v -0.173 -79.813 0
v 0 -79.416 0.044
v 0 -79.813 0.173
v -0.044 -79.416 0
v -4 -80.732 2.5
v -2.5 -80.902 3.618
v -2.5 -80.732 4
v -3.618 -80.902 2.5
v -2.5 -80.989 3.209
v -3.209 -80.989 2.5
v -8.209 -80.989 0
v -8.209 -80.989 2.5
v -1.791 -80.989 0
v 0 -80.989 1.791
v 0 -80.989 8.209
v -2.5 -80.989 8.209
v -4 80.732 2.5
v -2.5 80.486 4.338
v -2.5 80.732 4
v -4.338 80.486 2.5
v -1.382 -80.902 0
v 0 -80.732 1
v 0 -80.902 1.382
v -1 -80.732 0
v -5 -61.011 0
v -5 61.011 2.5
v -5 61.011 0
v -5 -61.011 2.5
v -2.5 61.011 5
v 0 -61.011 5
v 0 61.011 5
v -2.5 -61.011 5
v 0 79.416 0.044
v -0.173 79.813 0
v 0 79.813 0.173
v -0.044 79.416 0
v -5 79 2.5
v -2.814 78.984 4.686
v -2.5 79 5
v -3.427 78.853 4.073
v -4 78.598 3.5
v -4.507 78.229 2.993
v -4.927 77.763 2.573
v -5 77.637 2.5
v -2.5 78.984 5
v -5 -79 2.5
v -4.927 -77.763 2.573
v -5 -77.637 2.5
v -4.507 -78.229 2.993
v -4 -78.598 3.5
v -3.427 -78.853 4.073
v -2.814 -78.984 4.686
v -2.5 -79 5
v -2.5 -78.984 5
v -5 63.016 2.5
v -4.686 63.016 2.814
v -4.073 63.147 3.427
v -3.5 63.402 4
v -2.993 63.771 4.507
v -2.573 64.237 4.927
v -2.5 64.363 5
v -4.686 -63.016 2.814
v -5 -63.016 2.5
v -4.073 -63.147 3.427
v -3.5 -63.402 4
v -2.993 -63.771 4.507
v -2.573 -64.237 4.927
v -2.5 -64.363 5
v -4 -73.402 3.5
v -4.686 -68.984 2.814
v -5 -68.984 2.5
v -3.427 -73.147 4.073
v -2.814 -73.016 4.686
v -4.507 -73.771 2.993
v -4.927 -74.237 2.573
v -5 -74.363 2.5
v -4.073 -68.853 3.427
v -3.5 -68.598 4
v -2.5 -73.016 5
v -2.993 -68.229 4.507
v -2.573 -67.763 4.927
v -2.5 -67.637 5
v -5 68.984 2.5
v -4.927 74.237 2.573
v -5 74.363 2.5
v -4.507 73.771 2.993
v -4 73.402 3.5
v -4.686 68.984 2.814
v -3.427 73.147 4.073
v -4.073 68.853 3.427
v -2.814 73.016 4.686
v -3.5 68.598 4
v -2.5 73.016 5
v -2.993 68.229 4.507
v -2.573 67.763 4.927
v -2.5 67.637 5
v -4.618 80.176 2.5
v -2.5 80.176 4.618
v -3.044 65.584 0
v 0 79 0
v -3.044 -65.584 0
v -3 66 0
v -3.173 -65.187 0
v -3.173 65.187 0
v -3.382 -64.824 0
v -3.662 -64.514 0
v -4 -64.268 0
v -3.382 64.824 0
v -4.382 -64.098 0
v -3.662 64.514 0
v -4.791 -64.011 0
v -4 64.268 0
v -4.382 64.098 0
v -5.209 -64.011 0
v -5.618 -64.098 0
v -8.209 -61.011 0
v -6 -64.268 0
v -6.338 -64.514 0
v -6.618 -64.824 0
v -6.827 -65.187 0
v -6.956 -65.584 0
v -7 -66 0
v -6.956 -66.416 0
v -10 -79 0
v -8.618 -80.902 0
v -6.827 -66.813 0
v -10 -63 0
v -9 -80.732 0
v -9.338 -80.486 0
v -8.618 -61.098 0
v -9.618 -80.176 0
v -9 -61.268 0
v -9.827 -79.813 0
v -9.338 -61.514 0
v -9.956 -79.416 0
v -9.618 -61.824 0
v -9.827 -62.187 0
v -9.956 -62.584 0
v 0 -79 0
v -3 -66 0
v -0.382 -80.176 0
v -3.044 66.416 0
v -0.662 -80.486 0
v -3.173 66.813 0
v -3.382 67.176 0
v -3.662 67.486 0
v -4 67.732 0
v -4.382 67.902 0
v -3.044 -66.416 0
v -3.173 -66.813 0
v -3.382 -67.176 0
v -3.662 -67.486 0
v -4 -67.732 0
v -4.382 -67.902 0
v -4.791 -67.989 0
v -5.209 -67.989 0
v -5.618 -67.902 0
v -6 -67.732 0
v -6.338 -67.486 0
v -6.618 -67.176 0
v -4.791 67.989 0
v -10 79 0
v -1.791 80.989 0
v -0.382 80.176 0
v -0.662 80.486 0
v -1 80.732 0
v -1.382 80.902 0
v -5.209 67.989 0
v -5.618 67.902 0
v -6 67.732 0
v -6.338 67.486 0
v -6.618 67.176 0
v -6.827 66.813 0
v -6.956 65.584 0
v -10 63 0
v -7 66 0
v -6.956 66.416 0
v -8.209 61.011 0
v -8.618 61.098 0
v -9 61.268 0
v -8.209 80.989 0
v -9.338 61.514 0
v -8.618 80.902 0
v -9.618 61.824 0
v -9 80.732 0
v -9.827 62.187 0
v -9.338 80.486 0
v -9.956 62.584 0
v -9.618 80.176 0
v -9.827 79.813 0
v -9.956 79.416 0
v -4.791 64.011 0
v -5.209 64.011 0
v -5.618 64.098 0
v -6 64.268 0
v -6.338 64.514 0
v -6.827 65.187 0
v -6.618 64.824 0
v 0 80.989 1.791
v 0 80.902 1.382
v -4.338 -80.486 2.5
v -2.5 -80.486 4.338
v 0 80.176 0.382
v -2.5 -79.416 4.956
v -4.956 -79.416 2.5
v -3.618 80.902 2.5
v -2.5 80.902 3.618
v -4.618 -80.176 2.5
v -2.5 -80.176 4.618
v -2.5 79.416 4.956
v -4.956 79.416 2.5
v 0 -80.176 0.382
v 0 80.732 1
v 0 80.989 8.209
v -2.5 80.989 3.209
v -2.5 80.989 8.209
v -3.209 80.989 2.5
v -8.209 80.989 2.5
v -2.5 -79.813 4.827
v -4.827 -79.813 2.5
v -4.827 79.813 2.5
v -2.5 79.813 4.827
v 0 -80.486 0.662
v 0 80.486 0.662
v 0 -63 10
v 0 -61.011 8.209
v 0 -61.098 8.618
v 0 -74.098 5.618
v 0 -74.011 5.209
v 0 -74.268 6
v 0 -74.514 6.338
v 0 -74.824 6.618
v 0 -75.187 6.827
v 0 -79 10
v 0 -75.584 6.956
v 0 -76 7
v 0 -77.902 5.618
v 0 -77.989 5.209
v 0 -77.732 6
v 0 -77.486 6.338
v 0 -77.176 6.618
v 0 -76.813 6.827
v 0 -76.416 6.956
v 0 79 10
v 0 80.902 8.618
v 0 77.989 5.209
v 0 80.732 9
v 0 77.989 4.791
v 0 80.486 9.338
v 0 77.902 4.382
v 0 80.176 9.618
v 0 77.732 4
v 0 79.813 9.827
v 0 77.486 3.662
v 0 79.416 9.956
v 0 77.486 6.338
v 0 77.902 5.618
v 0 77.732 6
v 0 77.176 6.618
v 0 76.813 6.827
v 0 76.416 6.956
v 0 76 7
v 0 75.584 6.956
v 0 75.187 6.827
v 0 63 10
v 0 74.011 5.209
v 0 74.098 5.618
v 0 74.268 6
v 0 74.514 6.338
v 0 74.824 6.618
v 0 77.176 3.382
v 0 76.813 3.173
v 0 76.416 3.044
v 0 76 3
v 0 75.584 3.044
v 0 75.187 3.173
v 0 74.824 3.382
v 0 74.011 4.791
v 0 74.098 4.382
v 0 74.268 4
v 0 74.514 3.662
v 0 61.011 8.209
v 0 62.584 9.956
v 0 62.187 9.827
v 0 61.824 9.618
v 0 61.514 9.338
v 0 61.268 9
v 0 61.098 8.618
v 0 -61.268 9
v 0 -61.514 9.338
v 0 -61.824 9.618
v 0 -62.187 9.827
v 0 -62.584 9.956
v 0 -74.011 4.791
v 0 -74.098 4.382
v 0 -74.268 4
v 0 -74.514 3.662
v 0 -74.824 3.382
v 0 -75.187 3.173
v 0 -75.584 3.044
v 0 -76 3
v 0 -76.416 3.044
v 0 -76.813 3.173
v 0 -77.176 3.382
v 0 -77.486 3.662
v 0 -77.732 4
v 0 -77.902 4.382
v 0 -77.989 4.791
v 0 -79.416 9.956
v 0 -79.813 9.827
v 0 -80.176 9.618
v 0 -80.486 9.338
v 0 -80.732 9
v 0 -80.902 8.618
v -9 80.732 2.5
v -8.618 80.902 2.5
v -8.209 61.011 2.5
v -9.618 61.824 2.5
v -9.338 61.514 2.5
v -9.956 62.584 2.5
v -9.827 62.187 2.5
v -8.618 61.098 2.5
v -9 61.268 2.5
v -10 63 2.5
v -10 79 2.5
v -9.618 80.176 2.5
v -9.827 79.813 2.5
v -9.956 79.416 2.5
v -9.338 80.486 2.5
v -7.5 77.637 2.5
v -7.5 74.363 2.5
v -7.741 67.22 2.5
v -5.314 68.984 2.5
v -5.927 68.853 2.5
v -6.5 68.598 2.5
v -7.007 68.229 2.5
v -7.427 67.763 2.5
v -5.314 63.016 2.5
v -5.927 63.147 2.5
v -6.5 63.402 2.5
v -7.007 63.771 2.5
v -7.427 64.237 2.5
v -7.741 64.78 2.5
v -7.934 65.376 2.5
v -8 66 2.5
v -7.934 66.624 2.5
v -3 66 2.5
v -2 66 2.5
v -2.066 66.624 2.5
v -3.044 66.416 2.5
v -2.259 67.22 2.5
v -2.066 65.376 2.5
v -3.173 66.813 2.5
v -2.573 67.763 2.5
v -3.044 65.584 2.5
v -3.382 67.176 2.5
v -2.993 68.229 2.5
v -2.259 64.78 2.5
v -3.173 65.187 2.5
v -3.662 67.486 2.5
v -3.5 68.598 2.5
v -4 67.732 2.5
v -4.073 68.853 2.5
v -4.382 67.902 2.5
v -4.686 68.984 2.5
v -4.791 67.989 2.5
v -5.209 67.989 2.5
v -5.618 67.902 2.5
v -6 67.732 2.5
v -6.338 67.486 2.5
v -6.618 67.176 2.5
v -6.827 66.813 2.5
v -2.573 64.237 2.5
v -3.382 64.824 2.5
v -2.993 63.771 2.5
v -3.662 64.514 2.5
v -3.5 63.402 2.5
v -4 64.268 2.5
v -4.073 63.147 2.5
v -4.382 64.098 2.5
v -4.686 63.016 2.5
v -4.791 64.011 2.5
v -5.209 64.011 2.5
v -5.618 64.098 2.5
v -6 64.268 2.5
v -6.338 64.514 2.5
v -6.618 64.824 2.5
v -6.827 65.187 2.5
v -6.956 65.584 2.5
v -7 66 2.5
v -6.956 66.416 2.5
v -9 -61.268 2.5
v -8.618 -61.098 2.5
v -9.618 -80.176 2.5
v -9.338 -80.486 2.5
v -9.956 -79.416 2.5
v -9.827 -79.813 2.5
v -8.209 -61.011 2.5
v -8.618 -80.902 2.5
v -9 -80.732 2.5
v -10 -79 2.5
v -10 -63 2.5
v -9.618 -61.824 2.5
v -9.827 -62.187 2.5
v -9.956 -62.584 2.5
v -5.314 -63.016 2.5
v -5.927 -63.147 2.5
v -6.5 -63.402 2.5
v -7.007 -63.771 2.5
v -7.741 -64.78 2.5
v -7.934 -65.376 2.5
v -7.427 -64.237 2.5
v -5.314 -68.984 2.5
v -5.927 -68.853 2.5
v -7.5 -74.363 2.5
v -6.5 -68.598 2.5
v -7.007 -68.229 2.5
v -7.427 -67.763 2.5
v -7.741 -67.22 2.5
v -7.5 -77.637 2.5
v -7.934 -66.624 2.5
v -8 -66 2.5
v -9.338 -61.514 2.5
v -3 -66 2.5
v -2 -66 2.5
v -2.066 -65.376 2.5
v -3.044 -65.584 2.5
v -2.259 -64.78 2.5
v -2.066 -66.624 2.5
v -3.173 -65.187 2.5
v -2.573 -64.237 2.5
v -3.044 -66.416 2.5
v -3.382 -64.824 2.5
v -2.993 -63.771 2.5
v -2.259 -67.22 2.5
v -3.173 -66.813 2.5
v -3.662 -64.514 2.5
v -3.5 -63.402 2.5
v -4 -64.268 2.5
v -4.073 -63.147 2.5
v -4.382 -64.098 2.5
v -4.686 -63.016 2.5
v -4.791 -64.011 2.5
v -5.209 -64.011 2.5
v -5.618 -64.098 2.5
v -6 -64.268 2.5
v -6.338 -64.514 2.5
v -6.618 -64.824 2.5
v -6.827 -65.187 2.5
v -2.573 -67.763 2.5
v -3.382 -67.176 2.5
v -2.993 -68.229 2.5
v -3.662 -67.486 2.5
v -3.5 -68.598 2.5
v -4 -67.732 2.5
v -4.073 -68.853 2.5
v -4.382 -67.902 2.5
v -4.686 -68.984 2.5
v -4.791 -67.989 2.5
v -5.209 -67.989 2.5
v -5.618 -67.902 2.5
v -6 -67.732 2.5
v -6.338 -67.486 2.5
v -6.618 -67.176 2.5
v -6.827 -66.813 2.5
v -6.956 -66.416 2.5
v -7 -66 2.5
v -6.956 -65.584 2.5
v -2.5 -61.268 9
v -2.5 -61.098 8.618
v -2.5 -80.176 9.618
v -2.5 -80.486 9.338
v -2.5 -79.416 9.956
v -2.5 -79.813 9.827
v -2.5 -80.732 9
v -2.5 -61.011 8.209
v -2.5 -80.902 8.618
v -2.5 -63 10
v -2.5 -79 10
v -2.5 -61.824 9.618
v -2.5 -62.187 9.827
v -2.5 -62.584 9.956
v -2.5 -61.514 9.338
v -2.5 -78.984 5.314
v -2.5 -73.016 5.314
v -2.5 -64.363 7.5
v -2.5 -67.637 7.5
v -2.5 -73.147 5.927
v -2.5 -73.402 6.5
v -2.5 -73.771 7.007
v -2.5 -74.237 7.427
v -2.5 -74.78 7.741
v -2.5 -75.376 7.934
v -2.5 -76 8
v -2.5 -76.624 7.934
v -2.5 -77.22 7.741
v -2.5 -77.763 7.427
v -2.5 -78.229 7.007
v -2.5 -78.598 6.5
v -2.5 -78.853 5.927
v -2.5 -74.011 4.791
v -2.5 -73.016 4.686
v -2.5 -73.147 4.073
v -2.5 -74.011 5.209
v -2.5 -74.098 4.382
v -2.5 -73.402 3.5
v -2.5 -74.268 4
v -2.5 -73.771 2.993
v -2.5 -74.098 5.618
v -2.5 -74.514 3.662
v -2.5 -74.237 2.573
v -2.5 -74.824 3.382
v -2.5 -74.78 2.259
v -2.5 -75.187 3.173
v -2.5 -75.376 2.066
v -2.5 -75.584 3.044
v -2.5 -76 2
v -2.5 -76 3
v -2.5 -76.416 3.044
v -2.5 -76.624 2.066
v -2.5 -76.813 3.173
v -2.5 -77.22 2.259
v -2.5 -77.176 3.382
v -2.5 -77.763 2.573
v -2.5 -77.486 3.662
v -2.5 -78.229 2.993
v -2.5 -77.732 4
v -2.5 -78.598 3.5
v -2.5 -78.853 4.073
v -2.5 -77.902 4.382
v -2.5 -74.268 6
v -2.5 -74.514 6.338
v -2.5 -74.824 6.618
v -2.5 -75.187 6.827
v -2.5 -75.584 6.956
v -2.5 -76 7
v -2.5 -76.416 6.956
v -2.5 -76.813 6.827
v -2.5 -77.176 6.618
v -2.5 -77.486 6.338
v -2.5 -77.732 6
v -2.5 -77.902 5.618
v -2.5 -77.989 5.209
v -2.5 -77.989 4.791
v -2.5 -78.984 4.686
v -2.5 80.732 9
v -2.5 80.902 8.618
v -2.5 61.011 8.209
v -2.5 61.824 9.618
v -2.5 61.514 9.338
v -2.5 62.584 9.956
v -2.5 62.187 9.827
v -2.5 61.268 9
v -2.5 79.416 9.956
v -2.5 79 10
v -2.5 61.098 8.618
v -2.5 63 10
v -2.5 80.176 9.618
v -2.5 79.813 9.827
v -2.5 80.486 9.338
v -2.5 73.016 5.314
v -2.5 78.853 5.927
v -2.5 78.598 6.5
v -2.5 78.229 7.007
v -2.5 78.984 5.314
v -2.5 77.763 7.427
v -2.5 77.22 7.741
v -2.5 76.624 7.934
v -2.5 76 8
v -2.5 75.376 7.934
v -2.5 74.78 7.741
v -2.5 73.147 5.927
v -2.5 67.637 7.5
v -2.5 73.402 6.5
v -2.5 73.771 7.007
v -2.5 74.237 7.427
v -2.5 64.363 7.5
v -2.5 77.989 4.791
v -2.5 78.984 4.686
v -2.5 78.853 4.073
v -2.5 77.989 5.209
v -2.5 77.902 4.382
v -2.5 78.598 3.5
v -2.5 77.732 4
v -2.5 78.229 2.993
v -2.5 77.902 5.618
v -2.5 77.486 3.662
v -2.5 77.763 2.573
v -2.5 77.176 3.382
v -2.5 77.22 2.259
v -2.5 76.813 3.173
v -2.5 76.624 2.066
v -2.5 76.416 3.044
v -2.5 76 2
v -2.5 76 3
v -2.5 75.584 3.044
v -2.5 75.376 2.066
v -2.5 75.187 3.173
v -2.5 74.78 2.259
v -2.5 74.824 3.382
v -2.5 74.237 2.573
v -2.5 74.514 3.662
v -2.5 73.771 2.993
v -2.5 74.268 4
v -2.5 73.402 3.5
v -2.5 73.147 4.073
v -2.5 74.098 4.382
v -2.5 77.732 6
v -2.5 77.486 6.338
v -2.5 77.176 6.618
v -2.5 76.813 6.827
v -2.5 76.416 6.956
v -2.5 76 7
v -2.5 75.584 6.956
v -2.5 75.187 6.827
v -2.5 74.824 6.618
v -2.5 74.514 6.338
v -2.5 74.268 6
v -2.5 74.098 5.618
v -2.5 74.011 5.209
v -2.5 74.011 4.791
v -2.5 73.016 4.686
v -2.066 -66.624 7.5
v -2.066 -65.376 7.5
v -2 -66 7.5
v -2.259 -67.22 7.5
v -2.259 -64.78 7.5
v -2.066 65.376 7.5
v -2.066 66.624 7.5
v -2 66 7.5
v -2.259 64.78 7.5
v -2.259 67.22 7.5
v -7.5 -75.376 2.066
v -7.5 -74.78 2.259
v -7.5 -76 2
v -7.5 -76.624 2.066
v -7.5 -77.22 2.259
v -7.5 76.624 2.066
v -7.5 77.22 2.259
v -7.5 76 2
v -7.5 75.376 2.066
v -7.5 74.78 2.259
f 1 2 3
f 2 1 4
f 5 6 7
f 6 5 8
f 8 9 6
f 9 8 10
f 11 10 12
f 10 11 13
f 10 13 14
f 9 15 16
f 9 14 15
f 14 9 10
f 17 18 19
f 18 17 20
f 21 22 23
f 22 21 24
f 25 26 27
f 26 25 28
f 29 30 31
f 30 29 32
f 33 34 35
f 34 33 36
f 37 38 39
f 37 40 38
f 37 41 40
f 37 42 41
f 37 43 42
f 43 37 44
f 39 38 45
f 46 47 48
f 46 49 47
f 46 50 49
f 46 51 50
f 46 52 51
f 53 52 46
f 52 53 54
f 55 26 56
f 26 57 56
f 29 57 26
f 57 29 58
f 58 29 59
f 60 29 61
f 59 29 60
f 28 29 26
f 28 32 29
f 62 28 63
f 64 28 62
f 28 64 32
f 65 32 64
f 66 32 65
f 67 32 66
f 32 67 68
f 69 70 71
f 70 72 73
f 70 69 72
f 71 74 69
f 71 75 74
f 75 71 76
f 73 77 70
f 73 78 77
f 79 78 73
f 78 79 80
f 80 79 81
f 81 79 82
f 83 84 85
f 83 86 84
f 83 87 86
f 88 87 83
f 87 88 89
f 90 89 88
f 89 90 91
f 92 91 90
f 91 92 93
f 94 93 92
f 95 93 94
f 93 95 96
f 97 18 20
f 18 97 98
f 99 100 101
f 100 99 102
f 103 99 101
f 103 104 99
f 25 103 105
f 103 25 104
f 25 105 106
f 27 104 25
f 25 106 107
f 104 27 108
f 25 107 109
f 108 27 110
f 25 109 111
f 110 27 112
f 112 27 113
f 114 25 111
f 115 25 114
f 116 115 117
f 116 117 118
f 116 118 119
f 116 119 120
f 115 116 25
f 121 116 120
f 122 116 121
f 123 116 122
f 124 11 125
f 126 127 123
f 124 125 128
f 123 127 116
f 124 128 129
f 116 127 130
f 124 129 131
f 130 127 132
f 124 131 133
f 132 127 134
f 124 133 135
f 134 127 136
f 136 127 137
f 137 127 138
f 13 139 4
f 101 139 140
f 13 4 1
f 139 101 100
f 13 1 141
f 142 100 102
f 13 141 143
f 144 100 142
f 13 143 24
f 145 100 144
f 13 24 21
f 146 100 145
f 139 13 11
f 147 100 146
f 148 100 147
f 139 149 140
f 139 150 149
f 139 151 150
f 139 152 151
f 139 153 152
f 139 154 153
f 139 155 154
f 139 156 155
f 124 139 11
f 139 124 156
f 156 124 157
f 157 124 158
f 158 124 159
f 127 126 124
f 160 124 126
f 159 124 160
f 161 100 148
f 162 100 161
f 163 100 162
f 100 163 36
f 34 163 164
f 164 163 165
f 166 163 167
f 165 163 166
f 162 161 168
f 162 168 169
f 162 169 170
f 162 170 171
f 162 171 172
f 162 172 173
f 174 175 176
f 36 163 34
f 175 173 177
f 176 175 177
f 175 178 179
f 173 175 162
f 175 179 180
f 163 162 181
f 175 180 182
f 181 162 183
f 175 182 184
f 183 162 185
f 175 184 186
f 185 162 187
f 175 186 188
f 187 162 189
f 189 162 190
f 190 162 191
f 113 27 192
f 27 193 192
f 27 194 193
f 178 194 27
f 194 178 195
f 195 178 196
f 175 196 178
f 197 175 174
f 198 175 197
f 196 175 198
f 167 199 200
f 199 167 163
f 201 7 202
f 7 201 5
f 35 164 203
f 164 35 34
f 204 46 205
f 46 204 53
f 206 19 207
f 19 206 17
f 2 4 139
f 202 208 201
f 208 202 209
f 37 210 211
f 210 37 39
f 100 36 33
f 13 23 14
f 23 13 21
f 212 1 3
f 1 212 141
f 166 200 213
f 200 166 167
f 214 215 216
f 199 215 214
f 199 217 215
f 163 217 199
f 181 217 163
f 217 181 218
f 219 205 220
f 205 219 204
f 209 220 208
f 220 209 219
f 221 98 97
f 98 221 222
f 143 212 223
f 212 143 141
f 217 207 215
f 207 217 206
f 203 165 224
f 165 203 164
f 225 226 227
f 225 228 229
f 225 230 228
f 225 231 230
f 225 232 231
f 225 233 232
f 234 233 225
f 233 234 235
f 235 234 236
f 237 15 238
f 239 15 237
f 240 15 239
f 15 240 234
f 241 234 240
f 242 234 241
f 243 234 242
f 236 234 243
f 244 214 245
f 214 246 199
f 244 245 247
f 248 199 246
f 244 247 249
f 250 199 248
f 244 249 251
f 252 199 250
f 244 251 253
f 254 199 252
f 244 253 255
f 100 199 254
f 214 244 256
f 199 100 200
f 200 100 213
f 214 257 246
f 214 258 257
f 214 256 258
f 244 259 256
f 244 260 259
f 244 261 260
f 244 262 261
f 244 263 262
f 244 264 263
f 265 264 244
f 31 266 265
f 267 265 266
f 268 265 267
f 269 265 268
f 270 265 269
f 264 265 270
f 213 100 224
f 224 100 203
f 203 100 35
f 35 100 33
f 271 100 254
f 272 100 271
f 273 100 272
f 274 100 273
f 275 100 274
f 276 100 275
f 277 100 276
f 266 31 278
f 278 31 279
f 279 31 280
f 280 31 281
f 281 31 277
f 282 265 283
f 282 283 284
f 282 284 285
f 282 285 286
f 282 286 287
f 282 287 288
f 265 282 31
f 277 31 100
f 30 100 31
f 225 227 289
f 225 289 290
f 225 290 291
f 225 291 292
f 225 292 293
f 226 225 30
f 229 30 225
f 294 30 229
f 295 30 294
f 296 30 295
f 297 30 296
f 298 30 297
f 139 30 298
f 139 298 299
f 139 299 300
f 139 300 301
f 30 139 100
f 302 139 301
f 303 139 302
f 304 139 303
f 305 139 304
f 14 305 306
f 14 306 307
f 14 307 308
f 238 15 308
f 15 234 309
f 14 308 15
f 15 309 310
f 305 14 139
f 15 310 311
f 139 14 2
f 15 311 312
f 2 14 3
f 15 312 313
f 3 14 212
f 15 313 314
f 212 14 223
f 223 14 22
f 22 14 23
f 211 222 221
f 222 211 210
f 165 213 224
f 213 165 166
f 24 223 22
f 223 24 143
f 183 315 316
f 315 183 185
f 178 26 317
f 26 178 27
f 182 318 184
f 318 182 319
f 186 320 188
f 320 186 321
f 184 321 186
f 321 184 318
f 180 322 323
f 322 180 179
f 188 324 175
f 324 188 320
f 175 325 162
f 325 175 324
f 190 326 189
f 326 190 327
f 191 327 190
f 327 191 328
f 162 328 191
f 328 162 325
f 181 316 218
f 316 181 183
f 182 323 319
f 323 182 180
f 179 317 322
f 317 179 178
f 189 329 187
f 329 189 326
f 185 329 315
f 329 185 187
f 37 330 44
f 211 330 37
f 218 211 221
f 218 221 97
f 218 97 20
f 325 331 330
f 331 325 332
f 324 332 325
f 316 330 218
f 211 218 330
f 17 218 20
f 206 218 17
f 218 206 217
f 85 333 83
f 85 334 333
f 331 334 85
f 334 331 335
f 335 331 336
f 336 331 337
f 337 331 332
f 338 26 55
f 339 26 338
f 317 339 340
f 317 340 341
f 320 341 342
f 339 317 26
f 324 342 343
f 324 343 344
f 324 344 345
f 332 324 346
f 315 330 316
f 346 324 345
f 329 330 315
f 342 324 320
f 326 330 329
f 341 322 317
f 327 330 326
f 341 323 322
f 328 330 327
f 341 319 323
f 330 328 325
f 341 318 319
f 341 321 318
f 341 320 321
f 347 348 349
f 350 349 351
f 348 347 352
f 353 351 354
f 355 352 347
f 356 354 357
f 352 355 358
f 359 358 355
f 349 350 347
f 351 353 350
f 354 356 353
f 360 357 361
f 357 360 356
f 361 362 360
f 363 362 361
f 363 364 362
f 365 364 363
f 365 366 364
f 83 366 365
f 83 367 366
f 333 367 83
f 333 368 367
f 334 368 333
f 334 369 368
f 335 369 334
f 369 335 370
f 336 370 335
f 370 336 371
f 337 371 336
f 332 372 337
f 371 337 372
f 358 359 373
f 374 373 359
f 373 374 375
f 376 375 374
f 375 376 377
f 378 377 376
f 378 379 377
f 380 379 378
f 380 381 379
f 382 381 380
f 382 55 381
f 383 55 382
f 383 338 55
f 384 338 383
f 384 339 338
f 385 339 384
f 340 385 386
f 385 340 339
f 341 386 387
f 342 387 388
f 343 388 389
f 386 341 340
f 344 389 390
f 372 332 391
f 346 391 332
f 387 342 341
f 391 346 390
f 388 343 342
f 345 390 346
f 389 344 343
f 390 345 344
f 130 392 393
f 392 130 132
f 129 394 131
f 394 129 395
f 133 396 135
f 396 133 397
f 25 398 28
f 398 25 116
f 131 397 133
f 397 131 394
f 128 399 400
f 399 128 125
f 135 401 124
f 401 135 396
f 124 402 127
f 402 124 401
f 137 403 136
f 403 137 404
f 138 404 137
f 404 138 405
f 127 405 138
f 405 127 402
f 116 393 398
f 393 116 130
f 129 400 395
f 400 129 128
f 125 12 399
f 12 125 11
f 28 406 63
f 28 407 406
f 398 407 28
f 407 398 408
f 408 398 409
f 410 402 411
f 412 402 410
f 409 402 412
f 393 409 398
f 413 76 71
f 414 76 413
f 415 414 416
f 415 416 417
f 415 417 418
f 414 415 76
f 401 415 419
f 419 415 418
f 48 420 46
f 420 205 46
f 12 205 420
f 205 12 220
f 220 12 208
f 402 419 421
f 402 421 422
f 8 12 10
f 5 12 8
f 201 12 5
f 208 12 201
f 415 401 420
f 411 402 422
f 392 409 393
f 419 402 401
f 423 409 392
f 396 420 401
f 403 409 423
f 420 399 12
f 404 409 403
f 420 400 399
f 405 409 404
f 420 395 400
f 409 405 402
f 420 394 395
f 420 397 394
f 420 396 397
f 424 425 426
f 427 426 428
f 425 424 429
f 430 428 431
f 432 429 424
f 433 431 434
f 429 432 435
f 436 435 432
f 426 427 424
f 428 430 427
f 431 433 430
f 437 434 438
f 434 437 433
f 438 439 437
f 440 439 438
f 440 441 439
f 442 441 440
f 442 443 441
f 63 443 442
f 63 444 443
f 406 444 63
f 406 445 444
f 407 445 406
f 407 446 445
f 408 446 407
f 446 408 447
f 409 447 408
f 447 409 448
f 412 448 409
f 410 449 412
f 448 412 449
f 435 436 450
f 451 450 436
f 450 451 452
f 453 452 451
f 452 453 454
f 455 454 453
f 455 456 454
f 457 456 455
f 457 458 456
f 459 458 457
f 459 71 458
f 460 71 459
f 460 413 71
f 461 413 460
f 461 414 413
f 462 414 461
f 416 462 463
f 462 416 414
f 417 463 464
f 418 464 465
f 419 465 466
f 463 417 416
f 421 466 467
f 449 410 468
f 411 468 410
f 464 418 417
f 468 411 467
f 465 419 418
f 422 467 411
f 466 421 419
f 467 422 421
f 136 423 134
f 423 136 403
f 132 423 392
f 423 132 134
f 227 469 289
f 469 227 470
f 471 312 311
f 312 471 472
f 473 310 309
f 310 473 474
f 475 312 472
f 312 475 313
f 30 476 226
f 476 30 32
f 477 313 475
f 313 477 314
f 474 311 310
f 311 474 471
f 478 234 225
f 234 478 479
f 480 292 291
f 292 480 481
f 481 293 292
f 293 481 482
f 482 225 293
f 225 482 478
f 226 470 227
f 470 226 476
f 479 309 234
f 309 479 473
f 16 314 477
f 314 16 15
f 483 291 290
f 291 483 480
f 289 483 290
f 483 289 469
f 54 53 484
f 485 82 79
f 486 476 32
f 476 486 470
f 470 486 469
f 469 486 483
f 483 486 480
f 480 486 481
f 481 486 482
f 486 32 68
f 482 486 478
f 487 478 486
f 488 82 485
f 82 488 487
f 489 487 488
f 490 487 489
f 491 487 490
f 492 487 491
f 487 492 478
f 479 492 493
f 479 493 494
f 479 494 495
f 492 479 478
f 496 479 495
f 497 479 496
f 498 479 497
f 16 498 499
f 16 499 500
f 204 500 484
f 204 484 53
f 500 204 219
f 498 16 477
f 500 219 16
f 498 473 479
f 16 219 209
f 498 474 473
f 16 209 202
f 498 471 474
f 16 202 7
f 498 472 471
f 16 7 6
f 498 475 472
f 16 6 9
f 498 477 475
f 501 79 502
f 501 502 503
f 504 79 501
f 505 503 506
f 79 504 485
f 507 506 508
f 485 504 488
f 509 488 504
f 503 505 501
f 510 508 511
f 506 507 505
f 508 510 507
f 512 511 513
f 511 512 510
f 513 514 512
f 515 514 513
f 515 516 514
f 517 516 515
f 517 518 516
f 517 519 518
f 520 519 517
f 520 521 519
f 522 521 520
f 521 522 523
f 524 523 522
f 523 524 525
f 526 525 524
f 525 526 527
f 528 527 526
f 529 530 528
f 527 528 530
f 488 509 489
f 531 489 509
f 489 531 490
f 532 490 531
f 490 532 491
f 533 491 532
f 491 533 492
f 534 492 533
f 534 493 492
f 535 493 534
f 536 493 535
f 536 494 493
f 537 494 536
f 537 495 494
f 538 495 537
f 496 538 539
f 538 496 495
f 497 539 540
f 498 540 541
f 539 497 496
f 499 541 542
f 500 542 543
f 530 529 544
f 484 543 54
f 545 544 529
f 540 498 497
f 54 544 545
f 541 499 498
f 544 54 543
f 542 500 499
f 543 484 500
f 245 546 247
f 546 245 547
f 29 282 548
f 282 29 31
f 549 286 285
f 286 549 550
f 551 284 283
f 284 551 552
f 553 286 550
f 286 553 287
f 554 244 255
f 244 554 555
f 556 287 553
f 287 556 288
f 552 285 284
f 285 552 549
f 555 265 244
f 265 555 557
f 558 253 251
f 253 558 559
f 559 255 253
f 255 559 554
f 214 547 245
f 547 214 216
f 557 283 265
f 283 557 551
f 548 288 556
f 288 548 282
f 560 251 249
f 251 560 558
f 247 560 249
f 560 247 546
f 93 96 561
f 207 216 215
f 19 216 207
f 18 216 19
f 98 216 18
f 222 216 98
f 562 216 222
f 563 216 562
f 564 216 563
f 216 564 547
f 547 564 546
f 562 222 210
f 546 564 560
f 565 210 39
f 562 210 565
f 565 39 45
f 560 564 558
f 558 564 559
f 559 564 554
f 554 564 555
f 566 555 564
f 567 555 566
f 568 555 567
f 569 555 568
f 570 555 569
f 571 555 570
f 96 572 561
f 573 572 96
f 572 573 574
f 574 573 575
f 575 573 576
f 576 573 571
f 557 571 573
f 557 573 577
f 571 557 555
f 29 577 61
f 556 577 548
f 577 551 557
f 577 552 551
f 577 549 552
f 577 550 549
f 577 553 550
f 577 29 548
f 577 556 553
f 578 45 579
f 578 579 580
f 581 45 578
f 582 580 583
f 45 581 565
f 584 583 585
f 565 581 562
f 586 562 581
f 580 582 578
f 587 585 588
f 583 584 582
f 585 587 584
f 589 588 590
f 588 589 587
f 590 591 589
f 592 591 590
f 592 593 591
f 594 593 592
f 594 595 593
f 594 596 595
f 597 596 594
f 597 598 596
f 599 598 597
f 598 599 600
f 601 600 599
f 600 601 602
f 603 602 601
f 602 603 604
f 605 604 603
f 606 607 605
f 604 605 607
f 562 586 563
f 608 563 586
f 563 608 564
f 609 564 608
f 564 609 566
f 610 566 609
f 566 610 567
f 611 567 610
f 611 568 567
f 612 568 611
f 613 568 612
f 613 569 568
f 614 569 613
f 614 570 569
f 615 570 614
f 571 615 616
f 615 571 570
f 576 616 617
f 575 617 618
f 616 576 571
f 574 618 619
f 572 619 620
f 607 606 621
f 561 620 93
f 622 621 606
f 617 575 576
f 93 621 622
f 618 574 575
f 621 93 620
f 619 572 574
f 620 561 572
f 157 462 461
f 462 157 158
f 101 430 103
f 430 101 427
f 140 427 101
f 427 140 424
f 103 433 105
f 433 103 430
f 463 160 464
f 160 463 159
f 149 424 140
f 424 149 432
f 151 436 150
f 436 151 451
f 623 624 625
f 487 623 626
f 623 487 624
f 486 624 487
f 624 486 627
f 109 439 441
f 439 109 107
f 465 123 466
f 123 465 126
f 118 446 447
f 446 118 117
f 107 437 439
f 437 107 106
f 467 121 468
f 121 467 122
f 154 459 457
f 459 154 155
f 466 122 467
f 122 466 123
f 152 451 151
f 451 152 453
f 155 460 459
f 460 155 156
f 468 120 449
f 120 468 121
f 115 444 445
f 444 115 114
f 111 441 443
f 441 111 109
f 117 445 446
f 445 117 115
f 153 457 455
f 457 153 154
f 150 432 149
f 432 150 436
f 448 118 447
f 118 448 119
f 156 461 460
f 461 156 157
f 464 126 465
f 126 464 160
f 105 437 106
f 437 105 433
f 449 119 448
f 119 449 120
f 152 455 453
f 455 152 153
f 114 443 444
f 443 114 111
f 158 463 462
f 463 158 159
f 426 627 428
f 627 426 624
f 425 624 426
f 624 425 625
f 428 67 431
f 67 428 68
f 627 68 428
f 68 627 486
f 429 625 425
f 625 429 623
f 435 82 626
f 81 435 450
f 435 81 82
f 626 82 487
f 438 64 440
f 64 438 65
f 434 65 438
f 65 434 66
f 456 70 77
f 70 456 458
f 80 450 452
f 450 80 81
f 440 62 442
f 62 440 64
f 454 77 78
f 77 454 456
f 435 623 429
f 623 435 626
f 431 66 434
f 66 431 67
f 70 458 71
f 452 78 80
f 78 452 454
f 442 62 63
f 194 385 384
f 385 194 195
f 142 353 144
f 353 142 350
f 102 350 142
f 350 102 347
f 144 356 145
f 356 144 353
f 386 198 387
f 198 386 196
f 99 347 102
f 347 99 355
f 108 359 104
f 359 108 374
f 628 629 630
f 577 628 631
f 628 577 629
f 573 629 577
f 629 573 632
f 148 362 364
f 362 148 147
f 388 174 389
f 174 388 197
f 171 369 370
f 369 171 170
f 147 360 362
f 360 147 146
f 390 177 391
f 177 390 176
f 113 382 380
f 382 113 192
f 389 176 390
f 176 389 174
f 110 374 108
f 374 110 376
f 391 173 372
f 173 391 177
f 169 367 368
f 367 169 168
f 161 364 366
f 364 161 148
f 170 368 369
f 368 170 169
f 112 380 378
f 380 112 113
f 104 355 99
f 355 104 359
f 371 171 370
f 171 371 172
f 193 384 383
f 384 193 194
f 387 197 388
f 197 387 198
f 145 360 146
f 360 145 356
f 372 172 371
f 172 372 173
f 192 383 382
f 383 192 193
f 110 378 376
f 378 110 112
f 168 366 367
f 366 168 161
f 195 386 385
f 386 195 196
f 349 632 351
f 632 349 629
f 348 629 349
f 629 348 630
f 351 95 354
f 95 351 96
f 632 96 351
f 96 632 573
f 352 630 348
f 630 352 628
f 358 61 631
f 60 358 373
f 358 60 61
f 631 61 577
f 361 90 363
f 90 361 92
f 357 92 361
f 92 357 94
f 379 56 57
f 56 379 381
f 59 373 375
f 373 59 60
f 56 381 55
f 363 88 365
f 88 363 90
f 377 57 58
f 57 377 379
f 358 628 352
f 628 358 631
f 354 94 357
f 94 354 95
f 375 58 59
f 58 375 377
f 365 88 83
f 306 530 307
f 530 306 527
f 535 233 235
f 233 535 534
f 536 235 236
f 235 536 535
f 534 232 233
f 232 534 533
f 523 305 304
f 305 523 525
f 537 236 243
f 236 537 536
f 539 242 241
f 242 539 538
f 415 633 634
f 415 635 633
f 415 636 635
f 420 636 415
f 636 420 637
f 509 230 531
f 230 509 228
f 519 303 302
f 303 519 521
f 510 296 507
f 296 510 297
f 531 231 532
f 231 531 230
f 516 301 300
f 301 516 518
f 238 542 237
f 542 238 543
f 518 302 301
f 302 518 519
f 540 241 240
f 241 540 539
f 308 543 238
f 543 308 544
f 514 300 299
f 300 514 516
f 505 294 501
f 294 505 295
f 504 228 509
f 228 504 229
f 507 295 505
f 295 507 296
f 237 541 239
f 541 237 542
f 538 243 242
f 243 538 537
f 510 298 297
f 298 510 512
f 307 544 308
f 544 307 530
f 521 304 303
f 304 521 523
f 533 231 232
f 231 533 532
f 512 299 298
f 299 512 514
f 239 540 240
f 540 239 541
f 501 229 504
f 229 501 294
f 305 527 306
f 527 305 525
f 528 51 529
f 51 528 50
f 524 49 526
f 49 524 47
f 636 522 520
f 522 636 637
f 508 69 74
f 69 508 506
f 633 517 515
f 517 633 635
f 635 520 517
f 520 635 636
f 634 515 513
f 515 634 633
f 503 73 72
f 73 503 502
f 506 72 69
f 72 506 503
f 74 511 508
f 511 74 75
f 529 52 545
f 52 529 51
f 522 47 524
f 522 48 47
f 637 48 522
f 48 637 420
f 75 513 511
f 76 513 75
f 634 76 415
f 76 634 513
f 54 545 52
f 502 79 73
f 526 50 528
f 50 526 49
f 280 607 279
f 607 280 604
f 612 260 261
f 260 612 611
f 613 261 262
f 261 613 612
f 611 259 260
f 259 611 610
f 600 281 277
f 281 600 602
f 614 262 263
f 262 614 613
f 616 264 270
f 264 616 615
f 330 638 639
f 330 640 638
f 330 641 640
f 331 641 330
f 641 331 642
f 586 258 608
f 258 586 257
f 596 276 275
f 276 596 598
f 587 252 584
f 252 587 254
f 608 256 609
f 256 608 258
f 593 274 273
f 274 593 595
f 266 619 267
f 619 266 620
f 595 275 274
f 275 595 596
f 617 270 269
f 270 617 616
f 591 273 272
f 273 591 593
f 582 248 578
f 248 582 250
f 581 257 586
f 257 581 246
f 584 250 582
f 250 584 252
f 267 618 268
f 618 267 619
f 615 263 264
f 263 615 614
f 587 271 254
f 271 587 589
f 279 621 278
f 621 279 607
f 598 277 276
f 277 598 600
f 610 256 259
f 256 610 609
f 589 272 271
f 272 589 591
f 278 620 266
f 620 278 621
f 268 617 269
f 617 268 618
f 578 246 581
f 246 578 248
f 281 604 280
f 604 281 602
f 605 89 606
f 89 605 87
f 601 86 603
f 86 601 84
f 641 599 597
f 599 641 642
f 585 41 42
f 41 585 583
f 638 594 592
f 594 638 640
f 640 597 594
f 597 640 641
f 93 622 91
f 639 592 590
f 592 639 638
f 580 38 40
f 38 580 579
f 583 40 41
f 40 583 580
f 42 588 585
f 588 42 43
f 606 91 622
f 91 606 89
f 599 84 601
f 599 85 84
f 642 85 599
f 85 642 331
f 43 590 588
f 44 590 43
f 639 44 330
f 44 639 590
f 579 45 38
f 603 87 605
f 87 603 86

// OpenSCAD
HEIGHT = 10;
HEIGHT_MIDDLE = 5;
WIDTH = 162;
WIDTH_MIDDLE = WIDTH - 2 * 20;
THICKNESS = 2.5;
CORNER_DIA = 4;

MOUNT_HOLE_DIA = 4;
MOUNT_HOLE_HEAD_DIA = 6;
MOUNT_HOLE_OFFSET = 5;
MOUNT_HOLE_SPACING_TOP = WIDTH - 2 * MOUNT_HOLE_OFFSET;
MOUNT_HOLE_SPACING_BOT = WIDTH_MIDDLE + 2 * MOUNT_HOLE_OFFSET;

$fn = 30;

module rounded_rect(width, length, height, corner_dia) {
  hull() {
    for(i = [-1, 1]) {
      for(j = [-1, 1]) {
        translate([i * (width - corner_dia)/2, j * (length - corner_dia)/2, 0])
        cylinder(d = corner_dia, h = height);
      }
    }
  }
}

module mounting_holes(spacing) {
  #for(i = [-1, 1]) {
    translate([-MOUNT_HOLE_OFFSET, i * spacing/2, 0]) {
      cylinder(d = MOUNT_HOLE_DIA, h = HEIGHT);
      translate([0, 0, HEIGHT/2])
      cylinder(d = MOUNT_HOLE_HEAD_DIA, h = HEIGHT/2);
    }
  }
}

difference() {
  union() {
    hull() {
    translate([-HEIGHT_MIDDLE/2, 0, 0])
    rounded_rect(HEIGHT_MIDDLE, WIDTH, THICKNESS, CORNER_DIA);

    translate([-THICKNESS, 0, HEIGHT_MIDDLE/2])
    rotate(90, [0, 1, 0])
    rounded_rect(HEIGHT_MIDDLE, WIDTH, THICKNESS, CORNER_DIA);
    }
    w = (WIDTH-WIDTH_MIDDLE)/2;

    translate([-HEIGHT/2, (WIDTH - w)/2, 0])
    rounded_rect(HEIGHT, w, THICKNESS, CORNER_DIA);

    translate([-HEIGHT/2, -(WIDTH - w)/2, 0])
    rounded_rect(HEIGHT, w, THICKNESS, CORNER_DIA);

    translate([-THICKNESS, -(WIDTH - w)/2, HEIGHT/2])
    rotate(90, [0, 1, 0])
    rounded_rect(HEIGHT, w, THICKNESS, CORNER_DIA);

    translate([-THICKNESS, (WIDTH - w)/2, HEIGHT/2])
    rotate(90, [0, 1, 0])
    rounded_rect(HEIGHT, w, THICKNESS, CORNER_DIA);
  }
  translate([0, 0, -THICKNESS])
  mounting_holes(MOUNT_HOLE_SPACING_BOT);

  translate([THICKNESS, 0, 2 * MOUNT_HOLE_OFFSET])
  rotate(-90, [0, 1, 0])
  mounting_holes(MOUNT_HOLE_SPACING_TOP);
}
